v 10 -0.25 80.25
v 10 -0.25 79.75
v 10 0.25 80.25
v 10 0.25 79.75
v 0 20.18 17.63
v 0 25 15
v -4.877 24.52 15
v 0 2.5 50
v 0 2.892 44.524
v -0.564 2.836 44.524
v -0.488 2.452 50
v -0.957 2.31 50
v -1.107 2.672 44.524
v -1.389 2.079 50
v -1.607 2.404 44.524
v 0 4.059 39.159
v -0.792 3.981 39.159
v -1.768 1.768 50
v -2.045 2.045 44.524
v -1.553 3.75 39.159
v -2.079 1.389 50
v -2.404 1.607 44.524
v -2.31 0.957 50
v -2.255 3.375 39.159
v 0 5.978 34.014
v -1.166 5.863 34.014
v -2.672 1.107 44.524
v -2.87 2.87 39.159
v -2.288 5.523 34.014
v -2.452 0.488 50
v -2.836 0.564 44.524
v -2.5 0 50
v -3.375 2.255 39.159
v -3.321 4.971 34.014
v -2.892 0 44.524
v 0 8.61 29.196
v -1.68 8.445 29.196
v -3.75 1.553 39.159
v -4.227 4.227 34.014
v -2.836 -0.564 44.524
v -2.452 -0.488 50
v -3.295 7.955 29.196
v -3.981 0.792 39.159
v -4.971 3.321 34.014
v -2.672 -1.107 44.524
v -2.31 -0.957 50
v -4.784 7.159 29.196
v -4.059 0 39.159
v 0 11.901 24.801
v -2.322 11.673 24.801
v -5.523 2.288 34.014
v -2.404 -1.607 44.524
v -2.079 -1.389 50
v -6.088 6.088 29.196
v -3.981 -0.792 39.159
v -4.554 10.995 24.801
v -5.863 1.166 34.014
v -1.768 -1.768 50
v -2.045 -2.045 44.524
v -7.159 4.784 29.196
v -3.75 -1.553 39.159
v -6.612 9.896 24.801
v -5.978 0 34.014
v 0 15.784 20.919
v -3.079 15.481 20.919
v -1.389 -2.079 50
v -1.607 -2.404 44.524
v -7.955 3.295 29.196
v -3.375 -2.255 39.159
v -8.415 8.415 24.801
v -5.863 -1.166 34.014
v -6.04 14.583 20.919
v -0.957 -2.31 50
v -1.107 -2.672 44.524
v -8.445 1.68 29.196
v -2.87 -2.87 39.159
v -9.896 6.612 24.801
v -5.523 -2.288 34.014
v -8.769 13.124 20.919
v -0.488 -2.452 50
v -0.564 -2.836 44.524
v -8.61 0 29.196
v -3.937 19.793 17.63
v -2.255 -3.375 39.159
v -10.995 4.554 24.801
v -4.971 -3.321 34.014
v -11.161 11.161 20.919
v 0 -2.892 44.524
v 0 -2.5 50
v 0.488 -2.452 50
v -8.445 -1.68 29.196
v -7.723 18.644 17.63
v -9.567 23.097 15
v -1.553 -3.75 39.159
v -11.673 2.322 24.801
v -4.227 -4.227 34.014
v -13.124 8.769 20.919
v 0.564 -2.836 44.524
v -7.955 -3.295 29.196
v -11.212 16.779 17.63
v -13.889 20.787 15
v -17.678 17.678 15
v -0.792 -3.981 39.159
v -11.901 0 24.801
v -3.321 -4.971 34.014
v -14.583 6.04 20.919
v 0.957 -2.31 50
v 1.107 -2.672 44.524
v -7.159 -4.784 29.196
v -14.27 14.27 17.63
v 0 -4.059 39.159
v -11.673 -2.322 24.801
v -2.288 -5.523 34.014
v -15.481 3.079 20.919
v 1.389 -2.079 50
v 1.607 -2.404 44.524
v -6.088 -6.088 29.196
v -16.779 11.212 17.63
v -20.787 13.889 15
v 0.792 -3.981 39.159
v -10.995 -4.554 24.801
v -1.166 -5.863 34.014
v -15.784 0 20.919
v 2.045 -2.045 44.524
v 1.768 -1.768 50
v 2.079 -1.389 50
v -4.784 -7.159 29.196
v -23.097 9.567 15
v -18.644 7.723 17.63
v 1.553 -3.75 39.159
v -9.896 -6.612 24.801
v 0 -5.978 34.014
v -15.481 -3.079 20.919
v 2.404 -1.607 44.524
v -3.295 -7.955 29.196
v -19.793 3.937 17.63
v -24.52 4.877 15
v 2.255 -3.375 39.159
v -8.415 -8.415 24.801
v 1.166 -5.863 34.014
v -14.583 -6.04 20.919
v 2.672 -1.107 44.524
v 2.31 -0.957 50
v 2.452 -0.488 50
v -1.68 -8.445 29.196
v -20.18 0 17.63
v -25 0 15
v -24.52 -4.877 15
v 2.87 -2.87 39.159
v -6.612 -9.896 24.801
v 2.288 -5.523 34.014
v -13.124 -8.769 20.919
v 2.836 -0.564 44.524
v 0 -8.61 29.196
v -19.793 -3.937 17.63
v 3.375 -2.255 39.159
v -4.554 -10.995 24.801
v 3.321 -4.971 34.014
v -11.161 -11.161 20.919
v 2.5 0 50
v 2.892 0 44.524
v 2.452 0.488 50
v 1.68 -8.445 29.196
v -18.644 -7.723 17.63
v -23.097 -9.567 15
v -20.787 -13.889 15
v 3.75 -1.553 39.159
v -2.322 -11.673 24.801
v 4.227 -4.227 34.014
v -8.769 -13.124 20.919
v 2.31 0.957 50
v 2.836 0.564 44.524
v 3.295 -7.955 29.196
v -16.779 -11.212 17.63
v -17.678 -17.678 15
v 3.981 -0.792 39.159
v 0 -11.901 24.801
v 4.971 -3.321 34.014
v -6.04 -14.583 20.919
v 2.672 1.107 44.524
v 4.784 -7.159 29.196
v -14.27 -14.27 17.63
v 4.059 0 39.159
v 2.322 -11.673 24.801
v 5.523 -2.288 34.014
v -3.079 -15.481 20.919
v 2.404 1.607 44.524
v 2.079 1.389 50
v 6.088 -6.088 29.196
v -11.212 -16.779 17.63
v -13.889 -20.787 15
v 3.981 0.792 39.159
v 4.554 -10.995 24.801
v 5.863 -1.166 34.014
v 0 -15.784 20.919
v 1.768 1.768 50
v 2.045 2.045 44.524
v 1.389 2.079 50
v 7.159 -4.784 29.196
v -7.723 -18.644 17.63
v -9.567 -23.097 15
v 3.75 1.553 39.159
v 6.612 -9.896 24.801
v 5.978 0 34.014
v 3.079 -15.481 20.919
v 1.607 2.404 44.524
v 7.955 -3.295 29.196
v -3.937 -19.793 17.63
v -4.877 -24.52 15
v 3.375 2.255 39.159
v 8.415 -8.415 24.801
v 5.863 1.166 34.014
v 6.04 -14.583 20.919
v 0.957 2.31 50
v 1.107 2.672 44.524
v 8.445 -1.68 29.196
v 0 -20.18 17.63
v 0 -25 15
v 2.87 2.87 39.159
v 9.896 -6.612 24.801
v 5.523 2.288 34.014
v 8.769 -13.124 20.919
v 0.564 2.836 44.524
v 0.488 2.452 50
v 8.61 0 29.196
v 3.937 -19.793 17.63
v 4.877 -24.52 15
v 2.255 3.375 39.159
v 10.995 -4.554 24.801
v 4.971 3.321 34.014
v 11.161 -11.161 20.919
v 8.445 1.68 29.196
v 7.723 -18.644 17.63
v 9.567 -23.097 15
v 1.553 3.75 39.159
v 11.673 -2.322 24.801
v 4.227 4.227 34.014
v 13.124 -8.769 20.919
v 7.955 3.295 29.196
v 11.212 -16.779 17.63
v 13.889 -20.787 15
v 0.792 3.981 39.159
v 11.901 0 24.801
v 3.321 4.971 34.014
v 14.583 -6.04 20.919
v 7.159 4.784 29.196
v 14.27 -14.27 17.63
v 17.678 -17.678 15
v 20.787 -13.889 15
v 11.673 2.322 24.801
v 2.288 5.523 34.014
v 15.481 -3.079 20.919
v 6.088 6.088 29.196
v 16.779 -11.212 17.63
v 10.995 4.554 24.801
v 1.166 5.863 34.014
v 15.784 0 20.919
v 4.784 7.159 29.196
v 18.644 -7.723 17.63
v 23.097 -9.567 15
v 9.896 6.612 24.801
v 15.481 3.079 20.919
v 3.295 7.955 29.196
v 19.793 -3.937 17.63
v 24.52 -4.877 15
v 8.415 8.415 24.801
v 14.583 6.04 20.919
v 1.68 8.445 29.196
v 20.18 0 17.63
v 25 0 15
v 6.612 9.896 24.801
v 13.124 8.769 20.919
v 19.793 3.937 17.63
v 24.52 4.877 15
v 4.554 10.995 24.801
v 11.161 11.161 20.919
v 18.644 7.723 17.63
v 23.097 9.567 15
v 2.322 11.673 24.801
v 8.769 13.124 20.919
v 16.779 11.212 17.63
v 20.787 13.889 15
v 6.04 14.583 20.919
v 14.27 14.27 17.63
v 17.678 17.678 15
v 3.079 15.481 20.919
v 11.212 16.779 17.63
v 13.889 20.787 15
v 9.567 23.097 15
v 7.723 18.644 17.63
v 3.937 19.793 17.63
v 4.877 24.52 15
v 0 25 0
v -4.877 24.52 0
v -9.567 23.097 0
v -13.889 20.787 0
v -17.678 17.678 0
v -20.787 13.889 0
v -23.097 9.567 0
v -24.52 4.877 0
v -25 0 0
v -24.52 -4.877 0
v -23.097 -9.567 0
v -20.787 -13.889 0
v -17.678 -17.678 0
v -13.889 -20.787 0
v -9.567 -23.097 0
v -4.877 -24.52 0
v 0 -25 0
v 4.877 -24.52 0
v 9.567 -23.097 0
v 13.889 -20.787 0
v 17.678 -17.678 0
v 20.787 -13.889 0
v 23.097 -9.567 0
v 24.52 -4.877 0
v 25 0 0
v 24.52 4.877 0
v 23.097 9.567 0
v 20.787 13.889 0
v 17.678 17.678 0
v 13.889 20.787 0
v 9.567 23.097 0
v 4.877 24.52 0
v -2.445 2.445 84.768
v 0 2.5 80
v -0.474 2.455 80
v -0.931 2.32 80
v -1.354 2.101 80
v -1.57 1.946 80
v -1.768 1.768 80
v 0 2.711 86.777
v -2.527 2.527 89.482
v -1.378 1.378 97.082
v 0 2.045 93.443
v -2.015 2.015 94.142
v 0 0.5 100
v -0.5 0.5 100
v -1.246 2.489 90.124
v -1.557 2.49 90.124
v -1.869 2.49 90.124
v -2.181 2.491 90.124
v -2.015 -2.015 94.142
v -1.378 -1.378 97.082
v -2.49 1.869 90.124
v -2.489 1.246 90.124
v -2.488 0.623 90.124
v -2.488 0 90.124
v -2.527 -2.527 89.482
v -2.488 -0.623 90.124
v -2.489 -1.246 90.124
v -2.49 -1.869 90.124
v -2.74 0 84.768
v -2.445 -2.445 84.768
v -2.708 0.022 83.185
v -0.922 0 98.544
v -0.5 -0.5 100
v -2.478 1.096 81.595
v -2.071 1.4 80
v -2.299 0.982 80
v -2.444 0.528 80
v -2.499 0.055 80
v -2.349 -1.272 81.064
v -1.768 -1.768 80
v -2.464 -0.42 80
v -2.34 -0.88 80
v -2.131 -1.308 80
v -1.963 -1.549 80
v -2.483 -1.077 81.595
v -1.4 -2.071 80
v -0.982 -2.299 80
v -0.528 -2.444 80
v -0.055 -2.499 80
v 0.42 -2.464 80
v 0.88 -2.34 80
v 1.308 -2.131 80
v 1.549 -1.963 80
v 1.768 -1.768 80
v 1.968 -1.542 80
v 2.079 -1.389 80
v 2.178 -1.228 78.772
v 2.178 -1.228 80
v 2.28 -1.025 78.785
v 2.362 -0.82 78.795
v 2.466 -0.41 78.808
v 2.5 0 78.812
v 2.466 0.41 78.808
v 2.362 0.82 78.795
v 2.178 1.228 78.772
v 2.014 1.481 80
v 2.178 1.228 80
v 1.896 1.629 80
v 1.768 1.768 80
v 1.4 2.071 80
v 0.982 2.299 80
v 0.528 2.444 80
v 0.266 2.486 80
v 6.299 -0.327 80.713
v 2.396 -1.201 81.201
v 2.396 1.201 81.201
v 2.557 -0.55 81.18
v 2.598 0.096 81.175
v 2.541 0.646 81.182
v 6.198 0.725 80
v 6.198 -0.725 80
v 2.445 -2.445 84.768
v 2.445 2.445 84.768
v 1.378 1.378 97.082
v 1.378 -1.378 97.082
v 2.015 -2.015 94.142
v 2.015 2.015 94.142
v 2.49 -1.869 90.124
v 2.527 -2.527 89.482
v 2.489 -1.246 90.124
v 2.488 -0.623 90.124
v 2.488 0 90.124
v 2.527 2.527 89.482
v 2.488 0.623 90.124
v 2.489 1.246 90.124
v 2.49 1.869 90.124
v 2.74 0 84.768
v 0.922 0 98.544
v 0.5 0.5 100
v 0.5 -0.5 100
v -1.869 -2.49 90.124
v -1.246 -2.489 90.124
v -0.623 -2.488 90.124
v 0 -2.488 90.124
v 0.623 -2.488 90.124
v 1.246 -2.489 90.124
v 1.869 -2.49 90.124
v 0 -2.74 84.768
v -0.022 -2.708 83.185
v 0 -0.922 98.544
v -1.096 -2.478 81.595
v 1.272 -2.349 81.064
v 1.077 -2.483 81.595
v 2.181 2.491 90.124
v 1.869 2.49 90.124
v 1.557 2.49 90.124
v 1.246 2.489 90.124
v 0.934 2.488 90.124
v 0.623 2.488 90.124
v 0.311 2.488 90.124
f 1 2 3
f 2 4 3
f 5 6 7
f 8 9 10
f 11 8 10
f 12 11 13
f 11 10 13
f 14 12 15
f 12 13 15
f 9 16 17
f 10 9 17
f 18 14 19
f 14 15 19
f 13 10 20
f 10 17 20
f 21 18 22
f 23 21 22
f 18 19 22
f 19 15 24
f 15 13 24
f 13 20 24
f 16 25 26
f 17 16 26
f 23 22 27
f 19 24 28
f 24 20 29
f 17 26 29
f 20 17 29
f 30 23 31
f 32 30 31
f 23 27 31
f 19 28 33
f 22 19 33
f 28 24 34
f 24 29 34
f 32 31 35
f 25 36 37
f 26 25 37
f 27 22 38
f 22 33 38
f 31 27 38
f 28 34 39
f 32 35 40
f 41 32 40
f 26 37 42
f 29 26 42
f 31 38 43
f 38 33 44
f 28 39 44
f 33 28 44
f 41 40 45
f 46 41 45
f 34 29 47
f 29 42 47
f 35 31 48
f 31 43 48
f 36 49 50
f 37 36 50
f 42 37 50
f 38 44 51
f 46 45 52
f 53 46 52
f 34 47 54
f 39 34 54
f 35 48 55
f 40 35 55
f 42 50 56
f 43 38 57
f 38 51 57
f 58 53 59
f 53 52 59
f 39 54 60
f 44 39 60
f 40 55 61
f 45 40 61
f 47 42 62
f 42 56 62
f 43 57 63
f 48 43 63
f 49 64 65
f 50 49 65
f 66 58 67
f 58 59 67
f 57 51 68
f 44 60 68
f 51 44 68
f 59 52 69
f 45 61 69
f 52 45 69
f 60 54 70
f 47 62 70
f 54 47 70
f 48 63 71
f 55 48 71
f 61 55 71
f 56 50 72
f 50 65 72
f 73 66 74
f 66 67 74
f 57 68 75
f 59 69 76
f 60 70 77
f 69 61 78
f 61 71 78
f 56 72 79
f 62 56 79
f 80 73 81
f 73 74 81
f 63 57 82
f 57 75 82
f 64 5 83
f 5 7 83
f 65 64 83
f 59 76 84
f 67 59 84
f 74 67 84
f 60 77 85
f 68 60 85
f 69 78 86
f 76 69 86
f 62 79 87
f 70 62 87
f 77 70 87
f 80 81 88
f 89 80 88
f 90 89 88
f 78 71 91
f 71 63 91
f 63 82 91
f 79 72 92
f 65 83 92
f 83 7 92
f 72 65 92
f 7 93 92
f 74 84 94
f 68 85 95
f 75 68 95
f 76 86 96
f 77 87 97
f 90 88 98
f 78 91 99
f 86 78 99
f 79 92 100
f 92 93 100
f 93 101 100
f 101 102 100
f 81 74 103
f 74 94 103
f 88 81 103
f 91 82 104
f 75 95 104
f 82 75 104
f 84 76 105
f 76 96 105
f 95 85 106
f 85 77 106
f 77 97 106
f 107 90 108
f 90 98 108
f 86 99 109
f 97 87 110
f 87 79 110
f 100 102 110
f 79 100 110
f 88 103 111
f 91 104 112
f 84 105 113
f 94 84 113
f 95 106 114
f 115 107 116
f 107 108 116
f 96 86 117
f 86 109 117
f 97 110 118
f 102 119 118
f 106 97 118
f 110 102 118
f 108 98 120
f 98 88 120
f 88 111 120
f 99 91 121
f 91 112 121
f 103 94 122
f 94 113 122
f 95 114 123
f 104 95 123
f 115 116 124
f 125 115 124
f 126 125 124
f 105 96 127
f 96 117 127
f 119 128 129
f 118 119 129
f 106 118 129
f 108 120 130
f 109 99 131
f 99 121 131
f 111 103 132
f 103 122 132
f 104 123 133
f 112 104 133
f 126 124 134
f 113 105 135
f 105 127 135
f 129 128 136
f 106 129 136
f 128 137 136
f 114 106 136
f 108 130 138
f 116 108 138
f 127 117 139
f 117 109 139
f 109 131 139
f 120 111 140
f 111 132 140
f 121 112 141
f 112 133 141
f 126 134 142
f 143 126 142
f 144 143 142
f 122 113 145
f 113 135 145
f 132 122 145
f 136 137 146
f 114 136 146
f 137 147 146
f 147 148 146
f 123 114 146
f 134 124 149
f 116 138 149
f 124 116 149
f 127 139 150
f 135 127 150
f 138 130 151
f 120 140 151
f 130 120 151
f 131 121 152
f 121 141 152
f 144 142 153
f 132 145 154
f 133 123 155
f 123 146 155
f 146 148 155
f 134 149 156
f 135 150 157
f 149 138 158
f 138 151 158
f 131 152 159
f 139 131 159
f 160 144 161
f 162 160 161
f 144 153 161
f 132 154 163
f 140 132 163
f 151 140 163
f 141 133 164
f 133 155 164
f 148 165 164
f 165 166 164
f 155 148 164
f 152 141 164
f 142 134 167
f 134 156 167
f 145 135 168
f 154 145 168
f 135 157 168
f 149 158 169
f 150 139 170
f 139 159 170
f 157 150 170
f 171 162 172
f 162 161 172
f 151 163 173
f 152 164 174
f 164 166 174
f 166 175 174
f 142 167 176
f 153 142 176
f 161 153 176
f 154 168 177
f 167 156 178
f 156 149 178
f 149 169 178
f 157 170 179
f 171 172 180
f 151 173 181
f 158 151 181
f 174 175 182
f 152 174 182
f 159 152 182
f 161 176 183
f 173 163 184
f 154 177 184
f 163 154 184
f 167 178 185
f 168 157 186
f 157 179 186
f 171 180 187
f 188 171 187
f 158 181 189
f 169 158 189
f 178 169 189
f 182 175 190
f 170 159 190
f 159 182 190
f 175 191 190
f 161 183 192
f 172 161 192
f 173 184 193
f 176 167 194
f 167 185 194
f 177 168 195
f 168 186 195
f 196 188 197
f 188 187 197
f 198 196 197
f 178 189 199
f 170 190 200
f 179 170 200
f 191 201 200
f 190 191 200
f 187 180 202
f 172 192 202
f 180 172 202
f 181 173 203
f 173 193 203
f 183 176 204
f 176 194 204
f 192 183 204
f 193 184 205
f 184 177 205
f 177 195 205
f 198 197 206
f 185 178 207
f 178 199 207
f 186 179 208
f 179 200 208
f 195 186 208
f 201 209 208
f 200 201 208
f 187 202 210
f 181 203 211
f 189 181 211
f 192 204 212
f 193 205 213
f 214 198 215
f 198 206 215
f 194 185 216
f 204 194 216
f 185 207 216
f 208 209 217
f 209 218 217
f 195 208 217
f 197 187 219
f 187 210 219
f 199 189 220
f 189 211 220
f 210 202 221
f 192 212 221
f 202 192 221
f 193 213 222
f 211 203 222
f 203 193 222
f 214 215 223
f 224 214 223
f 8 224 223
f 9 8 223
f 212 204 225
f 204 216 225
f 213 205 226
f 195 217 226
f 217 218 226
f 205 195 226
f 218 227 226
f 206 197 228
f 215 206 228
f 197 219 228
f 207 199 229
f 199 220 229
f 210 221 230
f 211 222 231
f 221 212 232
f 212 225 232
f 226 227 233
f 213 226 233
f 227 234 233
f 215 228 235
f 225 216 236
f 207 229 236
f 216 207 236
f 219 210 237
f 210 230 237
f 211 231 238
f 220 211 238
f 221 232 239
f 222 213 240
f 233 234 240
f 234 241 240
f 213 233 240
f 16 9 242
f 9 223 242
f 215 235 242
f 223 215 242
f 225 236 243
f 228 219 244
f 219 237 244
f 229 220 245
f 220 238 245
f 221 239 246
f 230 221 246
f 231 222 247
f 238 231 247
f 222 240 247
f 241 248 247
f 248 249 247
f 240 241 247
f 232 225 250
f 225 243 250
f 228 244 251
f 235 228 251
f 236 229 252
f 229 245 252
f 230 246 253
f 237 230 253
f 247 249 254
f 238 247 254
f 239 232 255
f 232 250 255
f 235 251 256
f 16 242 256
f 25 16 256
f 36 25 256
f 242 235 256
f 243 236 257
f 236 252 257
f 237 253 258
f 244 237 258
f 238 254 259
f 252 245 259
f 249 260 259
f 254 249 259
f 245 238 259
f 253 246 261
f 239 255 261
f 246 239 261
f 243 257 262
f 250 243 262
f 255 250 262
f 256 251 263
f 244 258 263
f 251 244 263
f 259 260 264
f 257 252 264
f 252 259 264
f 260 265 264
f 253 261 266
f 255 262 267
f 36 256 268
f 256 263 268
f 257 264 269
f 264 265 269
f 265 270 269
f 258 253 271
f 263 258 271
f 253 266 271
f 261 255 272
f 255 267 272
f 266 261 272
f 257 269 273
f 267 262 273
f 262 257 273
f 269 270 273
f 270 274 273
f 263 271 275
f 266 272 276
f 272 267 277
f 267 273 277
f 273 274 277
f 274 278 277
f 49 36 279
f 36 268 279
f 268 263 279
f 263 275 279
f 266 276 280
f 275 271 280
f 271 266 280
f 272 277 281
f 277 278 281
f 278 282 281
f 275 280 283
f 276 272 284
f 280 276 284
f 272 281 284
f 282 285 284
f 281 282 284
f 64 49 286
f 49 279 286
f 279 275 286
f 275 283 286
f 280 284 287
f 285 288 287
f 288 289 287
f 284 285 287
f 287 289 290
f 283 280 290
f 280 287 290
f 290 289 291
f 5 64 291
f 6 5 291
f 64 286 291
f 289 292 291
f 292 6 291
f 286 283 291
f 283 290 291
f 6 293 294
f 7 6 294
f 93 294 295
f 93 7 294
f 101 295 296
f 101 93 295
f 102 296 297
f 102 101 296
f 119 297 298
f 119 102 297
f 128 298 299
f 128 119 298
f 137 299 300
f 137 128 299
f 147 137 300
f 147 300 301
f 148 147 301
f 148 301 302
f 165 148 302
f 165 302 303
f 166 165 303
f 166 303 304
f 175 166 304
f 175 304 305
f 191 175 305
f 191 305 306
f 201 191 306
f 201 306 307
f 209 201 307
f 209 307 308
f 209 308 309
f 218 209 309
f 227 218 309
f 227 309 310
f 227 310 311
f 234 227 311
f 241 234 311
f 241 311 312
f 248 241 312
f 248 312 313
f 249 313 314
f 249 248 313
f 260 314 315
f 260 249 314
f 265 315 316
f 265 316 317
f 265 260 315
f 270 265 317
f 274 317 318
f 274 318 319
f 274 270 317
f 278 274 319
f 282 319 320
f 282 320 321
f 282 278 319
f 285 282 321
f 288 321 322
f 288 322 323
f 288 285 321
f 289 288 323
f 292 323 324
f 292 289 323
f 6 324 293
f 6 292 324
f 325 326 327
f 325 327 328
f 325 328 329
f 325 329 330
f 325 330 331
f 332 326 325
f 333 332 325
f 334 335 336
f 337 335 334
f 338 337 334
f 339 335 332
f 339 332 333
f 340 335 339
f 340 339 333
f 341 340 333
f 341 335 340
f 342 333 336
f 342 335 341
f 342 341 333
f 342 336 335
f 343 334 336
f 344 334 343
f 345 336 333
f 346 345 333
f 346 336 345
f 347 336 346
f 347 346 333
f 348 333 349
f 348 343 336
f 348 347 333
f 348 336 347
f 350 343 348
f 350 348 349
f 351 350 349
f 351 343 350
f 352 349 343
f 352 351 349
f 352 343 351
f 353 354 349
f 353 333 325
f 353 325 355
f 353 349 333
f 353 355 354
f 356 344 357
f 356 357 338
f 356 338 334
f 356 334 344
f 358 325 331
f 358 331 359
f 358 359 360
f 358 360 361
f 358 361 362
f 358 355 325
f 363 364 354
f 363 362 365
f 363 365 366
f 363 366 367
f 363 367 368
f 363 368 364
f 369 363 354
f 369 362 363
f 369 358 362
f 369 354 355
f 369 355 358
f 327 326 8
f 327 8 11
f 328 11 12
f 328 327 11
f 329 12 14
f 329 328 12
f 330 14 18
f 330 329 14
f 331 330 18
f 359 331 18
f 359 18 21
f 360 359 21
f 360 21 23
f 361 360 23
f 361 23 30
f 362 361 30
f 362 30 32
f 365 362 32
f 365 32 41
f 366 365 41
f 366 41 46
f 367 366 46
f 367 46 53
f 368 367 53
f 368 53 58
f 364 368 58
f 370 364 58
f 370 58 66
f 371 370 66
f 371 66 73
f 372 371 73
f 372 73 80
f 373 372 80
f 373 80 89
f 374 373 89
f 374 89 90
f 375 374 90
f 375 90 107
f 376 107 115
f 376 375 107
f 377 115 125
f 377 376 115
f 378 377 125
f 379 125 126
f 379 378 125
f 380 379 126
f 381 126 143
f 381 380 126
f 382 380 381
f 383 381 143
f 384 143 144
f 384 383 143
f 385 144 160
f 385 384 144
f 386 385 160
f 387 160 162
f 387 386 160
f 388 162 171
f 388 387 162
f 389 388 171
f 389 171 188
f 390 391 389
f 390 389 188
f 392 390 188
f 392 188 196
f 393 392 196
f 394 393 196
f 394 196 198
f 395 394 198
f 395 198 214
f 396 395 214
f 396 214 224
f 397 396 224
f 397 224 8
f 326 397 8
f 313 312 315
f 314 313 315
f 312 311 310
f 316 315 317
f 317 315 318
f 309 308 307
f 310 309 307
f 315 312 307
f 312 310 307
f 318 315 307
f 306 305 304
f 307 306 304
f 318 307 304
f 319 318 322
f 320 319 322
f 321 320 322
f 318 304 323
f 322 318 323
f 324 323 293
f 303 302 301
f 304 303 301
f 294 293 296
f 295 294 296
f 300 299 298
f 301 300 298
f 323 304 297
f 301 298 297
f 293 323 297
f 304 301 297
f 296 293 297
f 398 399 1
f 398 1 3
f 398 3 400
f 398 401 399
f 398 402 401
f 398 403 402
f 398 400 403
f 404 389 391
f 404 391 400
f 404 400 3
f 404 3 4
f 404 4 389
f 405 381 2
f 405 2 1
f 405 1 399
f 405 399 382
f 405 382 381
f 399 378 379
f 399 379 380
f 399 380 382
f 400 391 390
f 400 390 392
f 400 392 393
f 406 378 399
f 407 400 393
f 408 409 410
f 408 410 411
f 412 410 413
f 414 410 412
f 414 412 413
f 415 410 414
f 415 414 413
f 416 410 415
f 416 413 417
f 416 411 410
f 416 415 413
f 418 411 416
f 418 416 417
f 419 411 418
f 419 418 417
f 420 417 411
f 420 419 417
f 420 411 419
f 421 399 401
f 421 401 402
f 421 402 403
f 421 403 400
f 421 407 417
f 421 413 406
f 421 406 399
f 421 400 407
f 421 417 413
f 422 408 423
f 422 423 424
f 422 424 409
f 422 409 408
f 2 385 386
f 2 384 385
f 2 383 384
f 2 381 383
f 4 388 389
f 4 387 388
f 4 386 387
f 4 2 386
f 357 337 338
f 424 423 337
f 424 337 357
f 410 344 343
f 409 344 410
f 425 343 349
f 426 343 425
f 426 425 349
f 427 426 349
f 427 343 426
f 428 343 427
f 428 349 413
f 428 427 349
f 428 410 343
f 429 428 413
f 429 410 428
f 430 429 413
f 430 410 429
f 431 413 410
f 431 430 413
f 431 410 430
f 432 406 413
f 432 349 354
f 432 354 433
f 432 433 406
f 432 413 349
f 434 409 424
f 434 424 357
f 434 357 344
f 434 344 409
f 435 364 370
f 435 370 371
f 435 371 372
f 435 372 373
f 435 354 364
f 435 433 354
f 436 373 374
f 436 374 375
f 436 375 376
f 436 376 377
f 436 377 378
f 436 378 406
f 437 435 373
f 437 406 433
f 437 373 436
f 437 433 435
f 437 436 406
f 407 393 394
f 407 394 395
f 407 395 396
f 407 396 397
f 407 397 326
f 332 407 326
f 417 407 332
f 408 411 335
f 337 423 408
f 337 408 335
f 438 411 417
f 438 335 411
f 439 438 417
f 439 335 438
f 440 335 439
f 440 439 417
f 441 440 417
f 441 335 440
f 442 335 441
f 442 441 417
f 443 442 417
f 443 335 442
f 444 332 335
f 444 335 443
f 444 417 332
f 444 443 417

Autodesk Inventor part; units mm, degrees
sketch "Sketch1" plane through (0, 0, 0) normal (1, 0, 0) x (0, 1, 0)
  line L0 (0, 0) -> (0, 80)
  line L1 (0, 0) -> (25, 0)
  line L2 (25, 0) -> (25, 15)
  line L3 (25, 15) -> (2.5, 15) construction
  line L4 (2.5, 15) -> (2.5, 50) construction
  line L5 (2.5, 80) -> (0, 80)
  arc A0 (2.5, 50) -> (25, 15) centre (40.9722, 50) ccw
  line L6 (2.5, 50) -> (2.5, 80)
  dimension "d0" = 50
  dimension "d1" = 80
  dimension "d2" = 15
  dimension "d3" = 5
  dimension "d4" = 35
revolve "Revolution1" add sketch "Sketch1" angle 360 about axis through (0, 0, 0) along (0, 0, 1)
ref_plane "Work Plane1" through (0, 0, 100) normal (0, 0, 1) x (1, 0, 0)
sketch "Sketch3" plane through (0, 0, 100) normal (0, 0, 1) x (1, 0, 0)
  line L0 (-0.5, -0.5) -> (0.5, -0.5)
  line L1 (0.5, -0.5) -> (0.5, 0.5)
  line L2 (0.5, 0.5) -> (-0.5, 0.5)
  line L3 (-0.5, 0.5) -> (-0.5, -0.5)
  line L4 (-0.5, -0.5) -> (0.5, 0.5) construction
  line L5 (0.5, -0.5) -> (-0.5, 0.5) construction
  point P0 (0, 0)
  dimension "d7" = 1
  dimension "d8" = 1
ref_plane "Work Plane2" through (0, 0, 90) normal (0, 0, 1) x (1, 0, 0)
sketch "Sketch4" plane through (0, 0, 90) normal (0, 0, 1) x (1, 0, 0)
  line L0 (-2.5, -2.5) -> (2.5, -2.5)
  line L1 (2.5, -2.5) -> (2.5, 2.5)
  line L2 (2.5, 2.5) -> (-2.5, 2.5)
  line L3 (-2.5, 2.5) -> (-2.5, -2.5)
  line L4 (-2.5, -2.5) -> (2.5, 2.5) construction
  line L5 (2.5, -2.5) -> (-2.5, 2.5) construction
  point P0 (0, 0)
  dimension "d10" = 5
  dimension "d11" = 5
loft "Loft1" add profiles "Sketch4", "Sketch3" section 1 edges at (0, -2.5, 80)
sketch "Sketch5" plane through (0, 0, 0) normal (1, 0, 0) x (0, 1, 0)
  line L0 (1.7678, 80) -> (1.7678, 80) projected
  line L1 (1.7678, 80) -> (-1.7678, 80) projected
  line L2 (-1.7678, 80) -> (-1.7678, 80) projected
  line L3 (-1.7678, 80) -> (1.7678, 80) projected
  line L4 (-2.5, 50) -> (2.5, 50) projected
  line L5 (-1.5, 81.5) -> (1.5, 81.5)
  line L6 (1.5, 81.5) -> (1.5, 78.5)
  line L7 (1.5, 78.5) -> (-1.5, 78.5)
  line L8 (-1.5, 78.5) -> (-1.5, 81.5)
  line L9 (-1.7678, 80) -> (1.7678, 80) projected
  line L10 (-1.5, 81.5) -> (1.5, 78.5) construction
  line L11 (1.5, 81.5) -> (-1.5, 78.5) construction
  point P0 (0, 0)
  point P1 (0, 80)
  dimension "d18" = 3
  dimension "d19" = 3
ref_plane "Work Plane3" through (10, 0, 0) normal (1, 0, 0) x (0, 1, 0)
sketch "Sketch6" plane through (10, 0, 0) normal (1, 0, 0) x (0, 1, 0)
  line L0 (1.7678, 80) -> (1.7678, 80) projected
  line L1 (1.7678, 80) -> (-2.5, 80) projected
  line L2 (-2.5, 80) -> (-1.7678, 80) projected
  line L3 (-1.7678, 80) -> (1.7678, 80) projected
  line L4 (-2.5, 50) -> (2.5, 50) projected
  line L5 (-0.25, 80.25) -> (0.25, 80.25)
  line L6 (0.25, 80.25) -> (0.25, 79.75)
  line L7 (0.25, 79.75) -> (-0.25, 79.75)
  line L8 (-0.25, 79.75) -> (-0.25, 80.25)
  line L9 (-2.5, 80) -> (1.7678, 80) projected
  line L10 (-0.25, 80.25) -> (0.25, 79.75) construction
  line L11 (0.25, 80.25) -> (-0.25, 79.75) construction
  point P0 (0, 0)
  point P1 (0, 80)
  dimension "d21" = 0.5
  dimension "d22" = 0.5
loft "Loft2" add profiles "Sketch5", "Sketch6"
properties part number "EndEffector"
